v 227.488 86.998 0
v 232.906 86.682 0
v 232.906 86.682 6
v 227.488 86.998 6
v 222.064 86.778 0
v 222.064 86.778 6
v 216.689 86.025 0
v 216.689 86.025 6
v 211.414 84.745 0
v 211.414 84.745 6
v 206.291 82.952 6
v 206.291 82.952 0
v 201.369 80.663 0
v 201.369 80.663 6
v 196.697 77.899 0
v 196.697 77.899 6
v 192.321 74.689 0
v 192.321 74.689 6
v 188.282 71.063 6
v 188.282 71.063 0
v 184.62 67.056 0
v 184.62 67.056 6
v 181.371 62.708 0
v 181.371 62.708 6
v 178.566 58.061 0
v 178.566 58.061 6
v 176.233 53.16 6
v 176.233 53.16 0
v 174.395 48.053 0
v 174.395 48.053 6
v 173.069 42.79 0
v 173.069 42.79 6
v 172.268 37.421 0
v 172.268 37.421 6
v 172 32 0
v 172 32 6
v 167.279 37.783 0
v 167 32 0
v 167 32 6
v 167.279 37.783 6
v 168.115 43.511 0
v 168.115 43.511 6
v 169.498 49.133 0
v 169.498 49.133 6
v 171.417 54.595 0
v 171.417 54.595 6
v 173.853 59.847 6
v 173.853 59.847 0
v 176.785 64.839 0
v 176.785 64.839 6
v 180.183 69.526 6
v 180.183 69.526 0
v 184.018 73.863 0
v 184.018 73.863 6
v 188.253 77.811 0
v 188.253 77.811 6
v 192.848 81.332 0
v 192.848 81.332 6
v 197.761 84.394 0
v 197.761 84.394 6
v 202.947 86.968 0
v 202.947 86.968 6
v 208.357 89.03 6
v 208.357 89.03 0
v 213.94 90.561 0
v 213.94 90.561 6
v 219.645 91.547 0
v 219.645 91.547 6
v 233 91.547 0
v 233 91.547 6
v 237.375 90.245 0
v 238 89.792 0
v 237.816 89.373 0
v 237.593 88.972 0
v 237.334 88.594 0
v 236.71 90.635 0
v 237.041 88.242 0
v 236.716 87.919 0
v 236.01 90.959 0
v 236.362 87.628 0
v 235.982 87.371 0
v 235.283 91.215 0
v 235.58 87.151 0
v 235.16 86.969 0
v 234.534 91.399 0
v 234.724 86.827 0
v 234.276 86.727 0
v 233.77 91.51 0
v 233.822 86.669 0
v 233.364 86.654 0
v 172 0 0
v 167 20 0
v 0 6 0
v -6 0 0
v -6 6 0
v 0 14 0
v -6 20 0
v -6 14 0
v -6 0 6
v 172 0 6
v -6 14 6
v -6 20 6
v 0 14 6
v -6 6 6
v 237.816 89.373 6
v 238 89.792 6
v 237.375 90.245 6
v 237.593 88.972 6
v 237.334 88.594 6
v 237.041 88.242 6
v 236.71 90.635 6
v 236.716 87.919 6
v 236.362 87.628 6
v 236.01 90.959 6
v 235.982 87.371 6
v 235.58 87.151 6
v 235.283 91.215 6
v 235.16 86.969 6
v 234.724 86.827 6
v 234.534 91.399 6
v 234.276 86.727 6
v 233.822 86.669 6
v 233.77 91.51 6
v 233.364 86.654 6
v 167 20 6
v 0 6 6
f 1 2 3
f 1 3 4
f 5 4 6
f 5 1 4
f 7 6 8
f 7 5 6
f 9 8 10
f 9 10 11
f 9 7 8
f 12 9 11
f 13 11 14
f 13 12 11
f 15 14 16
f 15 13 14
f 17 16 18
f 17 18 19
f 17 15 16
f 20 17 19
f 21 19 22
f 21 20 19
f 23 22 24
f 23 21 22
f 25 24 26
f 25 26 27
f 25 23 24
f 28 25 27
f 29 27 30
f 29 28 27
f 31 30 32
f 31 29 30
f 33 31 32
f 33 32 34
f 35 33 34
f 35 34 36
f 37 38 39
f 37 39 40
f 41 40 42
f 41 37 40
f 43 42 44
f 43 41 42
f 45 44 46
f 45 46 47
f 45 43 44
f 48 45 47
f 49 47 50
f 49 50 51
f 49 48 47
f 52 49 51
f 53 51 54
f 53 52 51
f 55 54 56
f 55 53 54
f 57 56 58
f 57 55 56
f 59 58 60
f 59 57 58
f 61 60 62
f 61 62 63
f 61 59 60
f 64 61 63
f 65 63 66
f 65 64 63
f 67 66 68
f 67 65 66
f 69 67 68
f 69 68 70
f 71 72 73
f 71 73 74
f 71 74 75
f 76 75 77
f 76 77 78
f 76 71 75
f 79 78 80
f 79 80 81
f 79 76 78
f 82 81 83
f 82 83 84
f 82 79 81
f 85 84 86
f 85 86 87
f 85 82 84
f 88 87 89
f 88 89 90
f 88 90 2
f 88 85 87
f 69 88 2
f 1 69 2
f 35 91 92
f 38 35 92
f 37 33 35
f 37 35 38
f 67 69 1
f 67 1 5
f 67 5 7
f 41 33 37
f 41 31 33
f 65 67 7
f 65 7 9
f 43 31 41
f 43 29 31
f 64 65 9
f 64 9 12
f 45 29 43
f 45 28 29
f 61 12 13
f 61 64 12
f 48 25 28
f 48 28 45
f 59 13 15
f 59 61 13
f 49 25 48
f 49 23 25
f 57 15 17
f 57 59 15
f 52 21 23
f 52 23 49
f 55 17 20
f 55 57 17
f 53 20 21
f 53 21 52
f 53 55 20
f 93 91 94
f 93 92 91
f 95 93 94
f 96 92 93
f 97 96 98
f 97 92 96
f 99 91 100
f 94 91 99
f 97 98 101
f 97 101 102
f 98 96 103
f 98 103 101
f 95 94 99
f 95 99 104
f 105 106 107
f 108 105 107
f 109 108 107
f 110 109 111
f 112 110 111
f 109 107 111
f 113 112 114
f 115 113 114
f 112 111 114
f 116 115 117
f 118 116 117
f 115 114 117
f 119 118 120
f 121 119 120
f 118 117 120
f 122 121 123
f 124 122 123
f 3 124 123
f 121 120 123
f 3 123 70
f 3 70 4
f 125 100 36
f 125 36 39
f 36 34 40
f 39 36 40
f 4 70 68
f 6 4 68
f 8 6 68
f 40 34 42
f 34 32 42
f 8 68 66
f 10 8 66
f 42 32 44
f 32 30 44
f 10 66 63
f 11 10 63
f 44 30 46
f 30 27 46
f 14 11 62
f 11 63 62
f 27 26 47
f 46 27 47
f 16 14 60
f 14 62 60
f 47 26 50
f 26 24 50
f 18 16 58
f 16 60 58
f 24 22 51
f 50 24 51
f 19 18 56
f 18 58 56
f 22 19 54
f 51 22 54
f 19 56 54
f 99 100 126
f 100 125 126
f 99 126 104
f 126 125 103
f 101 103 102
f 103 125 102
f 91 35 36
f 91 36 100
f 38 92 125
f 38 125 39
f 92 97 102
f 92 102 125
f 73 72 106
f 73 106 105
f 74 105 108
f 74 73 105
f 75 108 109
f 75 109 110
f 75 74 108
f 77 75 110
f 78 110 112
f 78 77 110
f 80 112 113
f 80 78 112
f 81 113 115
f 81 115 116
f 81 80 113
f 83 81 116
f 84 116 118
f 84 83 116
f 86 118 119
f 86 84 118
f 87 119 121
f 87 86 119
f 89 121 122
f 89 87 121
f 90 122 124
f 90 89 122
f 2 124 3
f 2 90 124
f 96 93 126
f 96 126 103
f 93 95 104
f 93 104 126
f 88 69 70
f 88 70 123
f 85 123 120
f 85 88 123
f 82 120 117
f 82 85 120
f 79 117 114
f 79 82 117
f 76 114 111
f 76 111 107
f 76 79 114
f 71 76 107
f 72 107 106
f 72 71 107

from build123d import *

# Parameters (mm, degrees)
EXTRUDE_1_DEPTH = 6


with BuildPart() as part:
    # Эскиз2 → Бобышка-Вытянуть1 (new body)
    with BuildSketch(Plane.XY):
        with BuildLine():
            Line((0, 20), (167, 20))
            Line((167, 20), (167, 32))
            ThreePointArc((167, 32), (182.048214587, 71.740873017), (219.644566271, 91.547439867))
            Line((219.644566271, 91.547439867), (233, 91.547439867))
            ThreePointArc((233, 91.547439867), (235.649529771, 91.095949123), (238, 89.792437865))
            ThreePointArc((238, 89.792437865), (235.982168822, 87.370794766), (232.906213145, 86.681959057))
            ThreePointArc((232.906213145, 86.681959057), (190.256576935, 72.925797017), (172, 32))
            Line((172, 32), (172, 0))
            Line((172, 0), (0, 0))
            Line((0, 0), (-6, 0))
            Line((-6, 0), (-6, 6))
            Line((-6, 6), (0, 6))
            Line((0, 6), (0, 14))
            Line((0, 14), (-6, 14))
            Line((-6, 14), (-6, 20))
            Line((-6, 20), (0, 20))
        make_face()
    extrude(amount=EXTRUDE_1_DEPTH)


solid = part.part
